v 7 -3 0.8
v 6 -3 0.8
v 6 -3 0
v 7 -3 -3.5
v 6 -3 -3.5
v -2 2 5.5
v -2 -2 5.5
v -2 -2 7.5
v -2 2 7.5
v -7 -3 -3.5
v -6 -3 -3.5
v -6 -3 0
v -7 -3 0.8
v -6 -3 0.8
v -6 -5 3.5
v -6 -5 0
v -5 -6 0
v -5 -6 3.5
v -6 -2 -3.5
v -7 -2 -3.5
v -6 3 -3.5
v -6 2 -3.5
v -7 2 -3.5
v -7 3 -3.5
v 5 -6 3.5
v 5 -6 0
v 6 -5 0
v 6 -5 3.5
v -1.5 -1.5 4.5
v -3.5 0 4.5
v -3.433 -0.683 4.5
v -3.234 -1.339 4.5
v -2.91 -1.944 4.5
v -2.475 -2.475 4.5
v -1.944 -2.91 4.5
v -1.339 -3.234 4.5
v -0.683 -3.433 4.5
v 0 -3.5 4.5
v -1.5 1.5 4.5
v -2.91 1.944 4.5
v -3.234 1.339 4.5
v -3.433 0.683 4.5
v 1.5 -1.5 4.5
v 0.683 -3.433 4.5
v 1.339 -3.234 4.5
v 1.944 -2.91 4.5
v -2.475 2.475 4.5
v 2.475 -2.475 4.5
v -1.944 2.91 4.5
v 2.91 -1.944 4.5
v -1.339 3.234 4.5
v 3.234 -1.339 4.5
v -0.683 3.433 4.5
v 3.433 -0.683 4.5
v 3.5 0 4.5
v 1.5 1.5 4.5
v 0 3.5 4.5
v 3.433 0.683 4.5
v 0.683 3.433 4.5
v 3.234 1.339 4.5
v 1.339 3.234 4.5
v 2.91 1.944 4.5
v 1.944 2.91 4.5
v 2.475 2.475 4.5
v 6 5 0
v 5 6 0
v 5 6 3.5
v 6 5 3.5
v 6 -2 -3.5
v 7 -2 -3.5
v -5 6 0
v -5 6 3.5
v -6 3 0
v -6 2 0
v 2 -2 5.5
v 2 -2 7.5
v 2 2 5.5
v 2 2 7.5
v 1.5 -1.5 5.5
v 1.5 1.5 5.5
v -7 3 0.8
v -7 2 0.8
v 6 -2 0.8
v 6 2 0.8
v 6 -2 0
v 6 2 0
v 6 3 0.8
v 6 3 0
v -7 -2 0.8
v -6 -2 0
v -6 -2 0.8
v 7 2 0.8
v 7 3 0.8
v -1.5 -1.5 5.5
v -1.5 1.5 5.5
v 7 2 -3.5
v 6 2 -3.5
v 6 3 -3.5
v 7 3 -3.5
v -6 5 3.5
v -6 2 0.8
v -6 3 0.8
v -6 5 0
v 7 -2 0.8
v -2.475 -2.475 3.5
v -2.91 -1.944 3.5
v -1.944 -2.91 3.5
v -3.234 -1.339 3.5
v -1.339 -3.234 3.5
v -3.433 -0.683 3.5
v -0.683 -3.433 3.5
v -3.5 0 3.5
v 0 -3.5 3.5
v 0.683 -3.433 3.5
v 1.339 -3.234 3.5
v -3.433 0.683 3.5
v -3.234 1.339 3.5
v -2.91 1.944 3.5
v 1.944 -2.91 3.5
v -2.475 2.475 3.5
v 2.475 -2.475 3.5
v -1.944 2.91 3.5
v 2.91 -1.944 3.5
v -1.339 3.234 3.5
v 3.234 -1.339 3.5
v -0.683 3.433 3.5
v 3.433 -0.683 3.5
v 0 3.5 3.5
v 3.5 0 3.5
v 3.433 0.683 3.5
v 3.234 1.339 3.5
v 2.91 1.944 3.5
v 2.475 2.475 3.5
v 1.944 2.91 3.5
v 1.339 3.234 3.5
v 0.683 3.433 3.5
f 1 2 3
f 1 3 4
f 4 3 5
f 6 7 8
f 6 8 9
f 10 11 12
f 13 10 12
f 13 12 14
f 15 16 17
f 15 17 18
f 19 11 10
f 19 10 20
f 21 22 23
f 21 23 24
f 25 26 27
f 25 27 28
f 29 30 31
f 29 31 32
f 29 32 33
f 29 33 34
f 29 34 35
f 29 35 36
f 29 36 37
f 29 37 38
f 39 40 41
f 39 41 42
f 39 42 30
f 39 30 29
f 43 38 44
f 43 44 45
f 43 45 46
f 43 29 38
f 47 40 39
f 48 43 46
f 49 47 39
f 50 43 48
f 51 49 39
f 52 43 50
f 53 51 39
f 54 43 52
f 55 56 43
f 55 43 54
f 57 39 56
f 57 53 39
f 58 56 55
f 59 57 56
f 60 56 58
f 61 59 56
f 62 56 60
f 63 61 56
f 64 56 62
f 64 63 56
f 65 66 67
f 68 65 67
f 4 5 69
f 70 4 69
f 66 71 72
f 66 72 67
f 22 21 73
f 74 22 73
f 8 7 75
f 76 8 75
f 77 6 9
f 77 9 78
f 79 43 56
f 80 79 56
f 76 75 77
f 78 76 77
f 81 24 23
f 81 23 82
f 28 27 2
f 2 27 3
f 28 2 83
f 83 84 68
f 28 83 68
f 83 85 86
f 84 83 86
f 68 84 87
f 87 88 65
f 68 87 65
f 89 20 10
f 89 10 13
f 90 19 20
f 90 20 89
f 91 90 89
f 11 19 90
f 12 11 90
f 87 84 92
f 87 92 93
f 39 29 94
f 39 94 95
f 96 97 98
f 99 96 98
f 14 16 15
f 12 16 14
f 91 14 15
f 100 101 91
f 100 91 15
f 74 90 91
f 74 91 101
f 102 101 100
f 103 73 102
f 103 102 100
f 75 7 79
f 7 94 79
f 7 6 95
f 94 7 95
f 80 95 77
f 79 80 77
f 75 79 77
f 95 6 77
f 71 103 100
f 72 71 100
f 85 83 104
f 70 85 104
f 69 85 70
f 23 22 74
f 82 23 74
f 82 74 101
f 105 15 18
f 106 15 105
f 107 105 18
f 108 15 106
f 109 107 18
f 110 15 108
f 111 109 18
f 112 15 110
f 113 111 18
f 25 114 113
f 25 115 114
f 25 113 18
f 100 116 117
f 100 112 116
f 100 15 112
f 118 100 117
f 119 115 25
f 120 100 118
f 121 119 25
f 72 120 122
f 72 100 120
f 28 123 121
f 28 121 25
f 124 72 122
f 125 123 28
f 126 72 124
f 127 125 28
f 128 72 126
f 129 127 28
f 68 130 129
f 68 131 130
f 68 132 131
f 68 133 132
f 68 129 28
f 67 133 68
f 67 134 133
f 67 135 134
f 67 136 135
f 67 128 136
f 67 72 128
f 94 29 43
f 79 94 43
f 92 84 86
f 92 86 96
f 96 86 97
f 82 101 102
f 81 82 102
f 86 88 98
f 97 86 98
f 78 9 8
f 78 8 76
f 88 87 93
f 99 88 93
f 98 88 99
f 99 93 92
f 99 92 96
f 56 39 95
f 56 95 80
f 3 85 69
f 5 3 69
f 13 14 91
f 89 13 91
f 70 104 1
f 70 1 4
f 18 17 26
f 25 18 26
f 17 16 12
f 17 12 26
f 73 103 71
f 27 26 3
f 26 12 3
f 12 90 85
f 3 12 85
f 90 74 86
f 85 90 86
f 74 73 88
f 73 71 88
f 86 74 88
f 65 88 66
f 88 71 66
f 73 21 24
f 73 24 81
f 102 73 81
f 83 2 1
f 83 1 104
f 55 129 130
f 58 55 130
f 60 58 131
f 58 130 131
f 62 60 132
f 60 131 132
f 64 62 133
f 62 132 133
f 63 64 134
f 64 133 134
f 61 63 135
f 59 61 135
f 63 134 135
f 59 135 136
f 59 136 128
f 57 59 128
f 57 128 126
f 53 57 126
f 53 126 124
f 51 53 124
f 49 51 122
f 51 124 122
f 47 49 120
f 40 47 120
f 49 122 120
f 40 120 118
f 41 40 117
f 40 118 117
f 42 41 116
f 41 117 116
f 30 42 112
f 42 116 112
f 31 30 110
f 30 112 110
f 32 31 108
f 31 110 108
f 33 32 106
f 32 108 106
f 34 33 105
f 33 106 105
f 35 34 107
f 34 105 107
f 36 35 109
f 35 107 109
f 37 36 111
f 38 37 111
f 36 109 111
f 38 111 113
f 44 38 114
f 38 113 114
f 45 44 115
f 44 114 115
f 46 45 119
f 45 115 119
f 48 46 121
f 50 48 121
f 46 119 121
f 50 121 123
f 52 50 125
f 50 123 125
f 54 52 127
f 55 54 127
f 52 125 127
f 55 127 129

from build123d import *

# Parameters (mm, degrees)
SKETCH_1_W      = 12
SKETCH_1_H      = 12
EXTRUDE_1_DEPTH = 3.5
SKETCH_2_R      = 3.5
EXTRUDE_2_DEPTH = 1
SKETCH_3_W      = 3
SKETCH_3_H      = 3
EXTRUDE_3_DEPTH = 1
SKETCH_4_W      = 4
SKETCH_4_H      = 4
EXTRUDE_4_DEPTH = 2
SKETCH_5_W      = 4.3
SKETCH_5_H      = 1
EXTRUDE_5_DEPTH = 1
SKETCH_7_W      = 4.3
SKETCH_7_H      = 1
EXTRUDE_6_DEPTH = 1
CHAMFER_1_SIZE  = 1


with BuildPart() as part:
    # 스케치1 → 보스-돌출1 (new body)
    with BuildSketch(Plane.XY):
        Rectangle(SKETCH_1_W, SKETCH_1_H)
    extrude(amount=EXTRUDE_1_DEPTH)

    # 스케치2 → 보스-돌출2 (add)
    with BuildSketch(Plane.XY.offset(3.5)):
        Circle(SKETCH_2_R)
    extrude(amount=EXTRUDE_2_DEPTH)

    # 스케치3 → 보스-돌출3 (add)
    with BuildSketch(Plane.XY.offset(4.5)):
        Rectangle(SKETCH_3_W, SKETCH_3_H)
    extrude(amount=EXTRUDE_3_DEPTH)

    # 스케치4 → 보스-돌출4 (add)
    with BuildSketch(Plane.XY.offset(5.5)):
        Rectangle(SKETCH_4_W, SKETCH_4_H)
    extrude(amount=EXTRUDE_4_DEPTH)

    # 스케치5 → 보스-돌출5 (add)
    with BuildSketch(Plane.ZY.offset(6)):
        with Locations((-1.35, 2.5)):
            Rectangle(SKETCH_5_W, SKETCH_5_H)
        with Locations((-1.35, -2.5)):
            Rectangle(SKETCH_5_W, SKETCH_5_H)
    extrude(amount=EXTRUDE_5_DEPTH)

    # 스케치7 → 보스-돌출6 (add)
    with BuildSketch(Plane(origin=(6, 0, 0), x_dir=(0, 0, -1), z_dir=(1, 0, 0))):
        with Locations((1.35, 2.5)):
            Rectangle(SKETCH_7_W, SKETCH_7_H)
        with Locations((1.35, -2.5)):
            Rectangle(SKETCH_7_W, SKETCH_7_H)
    extrude(amount=EXTRUDE_6_DEPTH)

    # 모따기1
    chamfer_1_edges = [part.edges().sort_by_distance(p)[0] for p in [
        (6, -6, 1.75),
        (-6, -6, 1.75),
        (-6, 6, 1.75),
        (6, 6, 1.75),
    ]]
    chamfer(chamfer_1_edges, length=CHAMFER_1_SIZE)


solid = part.part
